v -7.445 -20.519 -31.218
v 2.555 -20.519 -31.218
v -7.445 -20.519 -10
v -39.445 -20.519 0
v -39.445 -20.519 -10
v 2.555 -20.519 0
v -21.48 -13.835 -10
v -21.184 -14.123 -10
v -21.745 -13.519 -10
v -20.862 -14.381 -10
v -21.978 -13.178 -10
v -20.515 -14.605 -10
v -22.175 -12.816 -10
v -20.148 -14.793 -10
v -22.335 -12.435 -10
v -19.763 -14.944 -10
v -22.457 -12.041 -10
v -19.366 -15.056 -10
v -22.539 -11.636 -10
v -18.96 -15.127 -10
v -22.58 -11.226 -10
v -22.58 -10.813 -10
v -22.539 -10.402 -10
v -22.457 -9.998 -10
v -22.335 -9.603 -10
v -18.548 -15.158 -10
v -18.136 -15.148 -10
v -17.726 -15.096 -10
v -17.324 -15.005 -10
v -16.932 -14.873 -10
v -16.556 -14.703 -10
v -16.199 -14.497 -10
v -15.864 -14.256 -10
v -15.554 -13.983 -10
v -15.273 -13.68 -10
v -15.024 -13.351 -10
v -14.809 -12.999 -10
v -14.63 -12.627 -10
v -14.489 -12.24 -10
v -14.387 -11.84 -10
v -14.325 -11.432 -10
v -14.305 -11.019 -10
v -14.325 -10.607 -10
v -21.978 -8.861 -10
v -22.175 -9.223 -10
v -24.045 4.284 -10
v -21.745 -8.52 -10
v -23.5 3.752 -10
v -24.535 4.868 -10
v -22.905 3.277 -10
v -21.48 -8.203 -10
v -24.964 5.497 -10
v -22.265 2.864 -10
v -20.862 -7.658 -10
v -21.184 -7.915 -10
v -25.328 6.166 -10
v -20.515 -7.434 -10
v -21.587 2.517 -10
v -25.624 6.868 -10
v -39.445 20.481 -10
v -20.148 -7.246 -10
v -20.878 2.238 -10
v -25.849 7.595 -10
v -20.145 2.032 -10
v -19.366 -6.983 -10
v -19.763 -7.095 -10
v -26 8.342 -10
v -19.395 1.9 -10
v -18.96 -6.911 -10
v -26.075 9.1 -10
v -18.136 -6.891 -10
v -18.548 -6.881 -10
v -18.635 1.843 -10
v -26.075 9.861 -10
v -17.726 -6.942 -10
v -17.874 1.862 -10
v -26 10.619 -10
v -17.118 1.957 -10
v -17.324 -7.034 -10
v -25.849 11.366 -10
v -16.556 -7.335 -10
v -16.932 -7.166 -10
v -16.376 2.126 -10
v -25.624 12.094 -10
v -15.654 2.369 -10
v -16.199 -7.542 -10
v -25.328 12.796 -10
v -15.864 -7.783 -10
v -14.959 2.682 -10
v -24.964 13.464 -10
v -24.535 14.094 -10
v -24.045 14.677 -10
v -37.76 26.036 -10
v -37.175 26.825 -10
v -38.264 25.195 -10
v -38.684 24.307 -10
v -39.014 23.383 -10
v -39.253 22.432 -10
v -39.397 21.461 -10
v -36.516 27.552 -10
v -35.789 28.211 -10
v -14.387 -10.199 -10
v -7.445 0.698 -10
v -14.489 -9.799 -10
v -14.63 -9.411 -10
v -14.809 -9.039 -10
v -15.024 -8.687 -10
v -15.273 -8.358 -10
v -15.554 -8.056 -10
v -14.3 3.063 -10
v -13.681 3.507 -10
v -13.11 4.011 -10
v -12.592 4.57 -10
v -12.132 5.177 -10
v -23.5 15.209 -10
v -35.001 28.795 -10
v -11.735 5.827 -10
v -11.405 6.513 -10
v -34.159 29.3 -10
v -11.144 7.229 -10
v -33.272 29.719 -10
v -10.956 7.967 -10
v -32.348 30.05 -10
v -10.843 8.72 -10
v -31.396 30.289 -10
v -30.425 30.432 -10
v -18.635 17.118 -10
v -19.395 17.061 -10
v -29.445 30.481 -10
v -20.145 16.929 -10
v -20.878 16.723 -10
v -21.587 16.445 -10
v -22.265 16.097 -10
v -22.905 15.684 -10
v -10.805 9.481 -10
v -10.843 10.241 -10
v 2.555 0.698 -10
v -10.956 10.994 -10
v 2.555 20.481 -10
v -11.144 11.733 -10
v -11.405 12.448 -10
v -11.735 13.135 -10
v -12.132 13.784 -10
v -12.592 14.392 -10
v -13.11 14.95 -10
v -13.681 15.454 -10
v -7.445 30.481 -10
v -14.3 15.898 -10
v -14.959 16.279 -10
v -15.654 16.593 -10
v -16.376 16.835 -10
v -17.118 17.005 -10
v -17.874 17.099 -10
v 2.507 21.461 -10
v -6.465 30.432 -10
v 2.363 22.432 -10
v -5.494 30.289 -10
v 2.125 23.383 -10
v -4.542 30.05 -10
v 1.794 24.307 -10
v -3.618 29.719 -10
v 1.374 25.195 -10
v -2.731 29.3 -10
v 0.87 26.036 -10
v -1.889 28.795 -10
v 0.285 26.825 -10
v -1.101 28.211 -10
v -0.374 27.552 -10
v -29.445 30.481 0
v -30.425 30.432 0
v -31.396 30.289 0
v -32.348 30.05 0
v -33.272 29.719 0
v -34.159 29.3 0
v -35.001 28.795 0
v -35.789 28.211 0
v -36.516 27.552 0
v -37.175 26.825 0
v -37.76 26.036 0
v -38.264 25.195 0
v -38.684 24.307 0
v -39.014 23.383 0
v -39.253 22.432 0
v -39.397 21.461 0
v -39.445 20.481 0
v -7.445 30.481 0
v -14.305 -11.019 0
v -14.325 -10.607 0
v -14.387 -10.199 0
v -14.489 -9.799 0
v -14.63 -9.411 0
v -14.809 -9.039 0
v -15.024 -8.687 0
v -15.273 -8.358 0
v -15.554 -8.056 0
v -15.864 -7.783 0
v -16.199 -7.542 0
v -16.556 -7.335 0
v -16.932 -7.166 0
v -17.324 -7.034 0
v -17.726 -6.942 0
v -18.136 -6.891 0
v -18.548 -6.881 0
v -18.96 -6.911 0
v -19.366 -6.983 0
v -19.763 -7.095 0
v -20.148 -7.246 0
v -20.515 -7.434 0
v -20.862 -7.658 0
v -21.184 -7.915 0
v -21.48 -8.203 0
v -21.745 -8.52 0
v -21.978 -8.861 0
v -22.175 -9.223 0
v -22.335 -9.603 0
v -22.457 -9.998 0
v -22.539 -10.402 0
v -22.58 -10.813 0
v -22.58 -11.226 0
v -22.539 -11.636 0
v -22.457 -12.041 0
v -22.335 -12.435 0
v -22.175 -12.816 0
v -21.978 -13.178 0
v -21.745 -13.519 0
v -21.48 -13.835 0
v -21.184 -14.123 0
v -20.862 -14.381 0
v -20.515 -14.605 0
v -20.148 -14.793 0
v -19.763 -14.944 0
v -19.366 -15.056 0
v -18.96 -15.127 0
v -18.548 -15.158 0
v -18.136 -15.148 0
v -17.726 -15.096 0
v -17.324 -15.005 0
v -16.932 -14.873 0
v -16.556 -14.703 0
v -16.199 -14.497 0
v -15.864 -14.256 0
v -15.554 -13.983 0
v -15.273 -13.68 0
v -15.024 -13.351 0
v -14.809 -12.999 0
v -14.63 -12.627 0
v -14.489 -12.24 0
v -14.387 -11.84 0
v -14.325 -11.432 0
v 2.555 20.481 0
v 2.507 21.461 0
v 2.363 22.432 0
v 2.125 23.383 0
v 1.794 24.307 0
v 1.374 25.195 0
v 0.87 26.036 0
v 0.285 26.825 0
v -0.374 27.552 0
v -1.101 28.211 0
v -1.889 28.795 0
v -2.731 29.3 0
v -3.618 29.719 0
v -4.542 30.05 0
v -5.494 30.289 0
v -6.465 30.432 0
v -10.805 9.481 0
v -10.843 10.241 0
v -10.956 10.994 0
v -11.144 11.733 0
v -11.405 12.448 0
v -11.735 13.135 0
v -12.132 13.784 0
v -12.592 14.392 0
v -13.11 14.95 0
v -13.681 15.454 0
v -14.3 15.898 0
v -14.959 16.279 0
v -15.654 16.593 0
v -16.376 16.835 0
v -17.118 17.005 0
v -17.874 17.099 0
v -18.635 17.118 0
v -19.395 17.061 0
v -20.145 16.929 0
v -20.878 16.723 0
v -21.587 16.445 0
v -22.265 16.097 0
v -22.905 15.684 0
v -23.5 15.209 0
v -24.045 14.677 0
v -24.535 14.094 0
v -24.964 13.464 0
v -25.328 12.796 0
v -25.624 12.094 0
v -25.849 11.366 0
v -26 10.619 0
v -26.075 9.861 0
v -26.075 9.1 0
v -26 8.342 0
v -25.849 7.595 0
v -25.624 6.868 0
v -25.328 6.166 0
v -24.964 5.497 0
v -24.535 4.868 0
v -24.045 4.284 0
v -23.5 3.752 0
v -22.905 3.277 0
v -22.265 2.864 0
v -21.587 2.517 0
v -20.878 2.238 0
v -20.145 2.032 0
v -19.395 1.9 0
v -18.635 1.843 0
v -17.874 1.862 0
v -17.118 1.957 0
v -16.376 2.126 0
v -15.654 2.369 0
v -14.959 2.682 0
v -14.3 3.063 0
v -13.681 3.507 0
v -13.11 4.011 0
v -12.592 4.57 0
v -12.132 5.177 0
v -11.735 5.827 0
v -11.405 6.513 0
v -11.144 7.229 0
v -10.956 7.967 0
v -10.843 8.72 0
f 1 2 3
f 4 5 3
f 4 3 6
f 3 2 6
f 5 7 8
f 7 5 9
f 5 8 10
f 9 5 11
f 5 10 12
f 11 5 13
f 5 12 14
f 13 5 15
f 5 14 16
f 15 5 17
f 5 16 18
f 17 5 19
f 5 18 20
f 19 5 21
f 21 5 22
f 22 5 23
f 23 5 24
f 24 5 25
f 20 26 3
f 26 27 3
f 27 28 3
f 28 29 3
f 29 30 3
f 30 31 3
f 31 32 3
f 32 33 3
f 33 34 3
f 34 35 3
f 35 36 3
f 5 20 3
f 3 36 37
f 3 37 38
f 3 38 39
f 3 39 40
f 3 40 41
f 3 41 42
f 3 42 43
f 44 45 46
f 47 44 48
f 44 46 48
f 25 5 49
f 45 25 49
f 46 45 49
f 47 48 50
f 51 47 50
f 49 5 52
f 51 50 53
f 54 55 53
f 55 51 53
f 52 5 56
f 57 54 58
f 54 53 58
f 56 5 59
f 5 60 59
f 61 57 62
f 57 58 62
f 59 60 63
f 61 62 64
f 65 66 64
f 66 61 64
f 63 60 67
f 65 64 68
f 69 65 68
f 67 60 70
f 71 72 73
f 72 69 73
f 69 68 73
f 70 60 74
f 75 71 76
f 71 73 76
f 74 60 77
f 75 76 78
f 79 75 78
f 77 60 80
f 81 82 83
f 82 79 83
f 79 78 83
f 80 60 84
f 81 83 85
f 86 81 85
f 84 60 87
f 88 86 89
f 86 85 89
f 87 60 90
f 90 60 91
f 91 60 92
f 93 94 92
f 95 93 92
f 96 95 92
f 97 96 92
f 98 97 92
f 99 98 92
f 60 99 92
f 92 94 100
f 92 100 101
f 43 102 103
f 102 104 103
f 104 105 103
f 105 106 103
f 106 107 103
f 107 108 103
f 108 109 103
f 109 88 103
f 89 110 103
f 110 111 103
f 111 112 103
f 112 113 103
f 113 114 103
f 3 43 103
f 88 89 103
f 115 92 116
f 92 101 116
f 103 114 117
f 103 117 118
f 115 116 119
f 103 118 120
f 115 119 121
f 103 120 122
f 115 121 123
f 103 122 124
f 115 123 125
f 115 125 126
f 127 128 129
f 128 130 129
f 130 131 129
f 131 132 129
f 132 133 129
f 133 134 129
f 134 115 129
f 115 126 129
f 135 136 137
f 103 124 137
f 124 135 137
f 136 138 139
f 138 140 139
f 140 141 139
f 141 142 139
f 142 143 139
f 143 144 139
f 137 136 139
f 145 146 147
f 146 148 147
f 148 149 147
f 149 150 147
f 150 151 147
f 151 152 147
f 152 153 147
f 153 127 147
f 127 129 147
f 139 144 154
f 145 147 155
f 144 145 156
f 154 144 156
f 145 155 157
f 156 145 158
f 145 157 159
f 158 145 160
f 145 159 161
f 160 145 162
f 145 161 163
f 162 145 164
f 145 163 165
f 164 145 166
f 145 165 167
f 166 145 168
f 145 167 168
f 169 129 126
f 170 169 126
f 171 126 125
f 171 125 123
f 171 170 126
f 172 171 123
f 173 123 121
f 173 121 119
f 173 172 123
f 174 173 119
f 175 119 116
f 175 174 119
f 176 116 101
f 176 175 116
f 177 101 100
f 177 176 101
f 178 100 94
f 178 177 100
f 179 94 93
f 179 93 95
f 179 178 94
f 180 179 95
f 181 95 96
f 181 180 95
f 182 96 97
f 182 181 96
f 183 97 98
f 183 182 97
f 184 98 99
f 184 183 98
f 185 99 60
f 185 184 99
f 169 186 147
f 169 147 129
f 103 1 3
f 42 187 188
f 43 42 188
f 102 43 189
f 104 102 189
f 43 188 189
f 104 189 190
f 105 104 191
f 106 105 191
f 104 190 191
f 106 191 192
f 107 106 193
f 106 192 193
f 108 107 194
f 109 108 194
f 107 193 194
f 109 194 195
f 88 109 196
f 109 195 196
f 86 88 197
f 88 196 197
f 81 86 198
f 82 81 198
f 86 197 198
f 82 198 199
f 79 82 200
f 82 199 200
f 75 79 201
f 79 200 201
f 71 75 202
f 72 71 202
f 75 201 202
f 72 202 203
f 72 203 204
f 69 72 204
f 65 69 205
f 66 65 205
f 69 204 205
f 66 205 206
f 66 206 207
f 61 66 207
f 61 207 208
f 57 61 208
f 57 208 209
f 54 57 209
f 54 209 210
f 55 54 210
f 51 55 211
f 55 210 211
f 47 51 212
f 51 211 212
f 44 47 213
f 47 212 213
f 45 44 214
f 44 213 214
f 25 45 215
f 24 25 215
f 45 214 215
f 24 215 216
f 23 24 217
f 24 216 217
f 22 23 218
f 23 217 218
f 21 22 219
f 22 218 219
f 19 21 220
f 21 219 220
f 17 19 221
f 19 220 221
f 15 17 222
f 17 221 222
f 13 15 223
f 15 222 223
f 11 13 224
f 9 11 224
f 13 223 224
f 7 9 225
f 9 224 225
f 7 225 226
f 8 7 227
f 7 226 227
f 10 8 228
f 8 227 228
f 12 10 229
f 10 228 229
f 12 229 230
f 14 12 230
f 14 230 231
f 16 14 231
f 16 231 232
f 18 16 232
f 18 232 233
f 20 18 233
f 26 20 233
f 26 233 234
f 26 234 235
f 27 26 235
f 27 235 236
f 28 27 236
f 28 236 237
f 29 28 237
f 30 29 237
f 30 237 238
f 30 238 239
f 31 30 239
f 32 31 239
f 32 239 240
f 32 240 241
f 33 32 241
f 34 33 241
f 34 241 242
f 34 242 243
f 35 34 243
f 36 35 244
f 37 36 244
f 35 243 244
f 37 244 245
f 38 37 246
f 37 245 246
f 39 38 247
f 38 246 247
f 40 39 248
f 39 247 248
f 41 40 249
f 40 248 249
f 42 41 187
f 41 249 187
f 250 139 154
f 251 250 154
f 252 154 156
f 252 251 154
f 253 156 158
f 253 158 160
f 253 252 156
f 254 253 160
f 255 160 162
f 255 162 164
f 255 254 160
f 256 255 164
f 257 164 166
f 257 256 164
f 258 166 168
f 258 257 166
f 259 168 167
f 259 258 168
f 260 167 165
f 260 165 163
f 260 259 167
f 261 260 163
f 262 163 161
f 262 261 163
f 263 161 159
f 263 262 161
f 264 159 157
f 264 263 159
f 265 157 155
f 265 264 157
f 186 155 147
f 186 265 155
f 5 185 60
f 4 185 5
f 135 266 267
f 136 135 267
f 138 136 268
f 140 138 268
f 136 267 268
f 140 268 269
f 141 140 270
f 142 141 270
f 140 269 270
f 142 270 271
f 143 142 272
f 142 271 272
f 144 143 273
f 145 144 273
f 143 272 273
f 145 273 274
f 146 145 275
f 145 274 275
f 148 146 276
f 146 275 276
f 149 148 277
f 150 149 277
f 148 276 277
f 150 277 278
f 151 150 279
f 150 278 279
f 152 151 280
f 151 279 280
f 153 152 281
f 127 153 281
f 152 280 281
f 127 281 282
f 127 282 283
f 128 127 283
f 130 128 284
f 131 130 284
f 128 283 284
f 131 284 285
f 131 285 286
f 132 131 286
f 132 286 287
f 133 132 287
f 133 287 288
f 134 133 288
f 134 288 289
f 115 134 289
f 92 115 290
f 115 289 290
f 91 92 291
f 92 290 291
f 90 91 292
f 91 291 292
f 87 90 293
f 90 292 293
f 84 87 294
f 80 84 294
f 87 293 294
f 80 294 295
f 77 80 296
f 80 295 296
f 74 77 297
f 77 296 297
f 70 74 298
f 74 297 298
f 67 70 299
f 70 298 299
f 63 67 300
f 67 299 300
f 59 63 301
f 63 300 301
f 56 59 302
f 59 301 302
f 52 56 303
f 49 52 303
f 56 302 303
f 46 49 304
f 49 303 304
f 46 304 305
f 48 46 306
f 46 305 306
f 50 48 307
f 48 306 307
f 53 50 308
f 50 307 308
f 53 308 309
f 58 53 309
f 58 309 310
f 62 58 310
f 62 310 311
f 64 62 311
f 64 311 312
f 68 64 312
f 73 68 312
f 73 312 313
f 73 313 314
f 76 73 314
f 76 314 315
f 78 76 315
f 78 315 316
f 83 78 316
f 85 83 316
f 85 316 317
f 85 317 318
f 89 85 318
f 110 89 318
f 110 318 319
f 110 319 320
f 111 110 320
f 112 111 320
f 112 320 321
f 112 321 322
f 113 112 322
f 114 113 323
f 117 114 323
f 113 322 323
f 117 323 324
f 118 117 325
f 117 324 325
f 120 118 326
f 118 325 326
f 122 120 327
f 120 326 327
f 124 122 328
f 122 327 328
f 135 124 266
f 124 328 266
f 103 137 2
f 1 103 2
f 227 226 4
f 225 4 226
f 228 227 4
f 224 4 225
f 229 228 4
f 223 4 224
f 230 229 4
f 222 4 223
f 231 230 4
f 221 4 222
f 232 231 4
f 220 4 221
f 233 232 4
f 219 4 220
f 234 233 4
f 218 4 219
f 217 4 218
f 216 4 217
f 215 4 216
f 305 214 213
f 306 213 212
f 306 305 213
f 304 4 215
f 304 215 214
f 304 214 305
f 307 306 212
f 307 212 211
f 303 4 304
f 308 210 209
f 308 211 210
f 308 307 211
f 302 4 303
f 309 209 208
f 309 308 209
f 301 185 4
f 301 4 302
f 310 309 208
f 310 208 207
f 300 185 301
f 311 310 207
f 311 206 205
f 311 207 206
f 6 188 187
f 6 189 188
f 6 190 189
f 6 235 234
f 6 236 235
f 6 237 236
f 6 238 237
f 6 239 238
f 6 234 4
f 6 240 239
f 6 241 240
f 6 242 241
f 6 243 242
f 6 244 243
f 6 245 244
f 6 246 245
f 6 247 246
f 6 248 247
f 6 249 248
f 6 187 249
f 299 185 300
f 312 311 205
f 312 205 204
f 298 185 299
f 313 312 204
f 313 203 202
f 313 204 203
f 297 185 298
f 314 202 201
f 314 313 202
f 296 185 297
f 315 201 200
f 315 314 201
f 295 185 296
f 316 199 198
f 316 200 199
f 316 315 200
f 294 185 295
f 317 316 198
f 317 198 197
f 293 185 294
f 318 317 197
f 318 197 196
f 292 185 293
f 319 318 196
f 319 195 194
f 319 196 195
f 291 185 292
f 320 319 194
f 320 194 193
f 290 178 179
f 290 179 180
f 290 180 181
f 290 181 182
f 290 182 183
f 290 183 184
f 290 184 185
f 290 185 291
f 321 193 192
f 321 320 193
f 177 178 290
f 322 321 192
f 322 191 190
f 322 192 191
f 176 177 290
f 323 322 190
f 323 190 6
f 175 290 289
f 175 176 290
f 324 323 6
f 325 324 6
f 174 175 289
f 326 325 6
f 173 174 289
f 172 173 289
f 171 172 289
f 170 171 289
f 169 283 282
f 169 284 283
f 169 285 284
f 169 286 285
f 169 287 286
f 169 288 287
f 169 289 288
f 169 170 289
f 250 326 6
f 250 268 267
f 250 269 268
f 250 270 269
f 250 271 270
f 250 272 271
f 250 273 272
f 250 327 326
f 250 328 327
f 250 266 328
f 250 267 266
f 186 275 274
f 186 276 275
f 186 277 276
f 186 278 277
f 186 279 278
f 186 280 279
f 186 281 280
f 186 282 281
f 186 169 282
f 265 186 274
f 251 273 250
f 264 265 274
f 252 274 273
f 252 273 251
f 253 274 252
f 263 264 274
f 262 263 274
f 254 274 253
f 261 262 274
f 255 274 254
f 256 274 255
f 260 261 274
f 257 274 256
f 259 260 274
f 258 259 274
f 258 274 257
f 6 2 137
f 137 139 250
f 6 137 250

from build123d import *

# Parameters (mm, degrees)
SKETCH1_R           = 7.64
SKETCH1_R_2         = 4.14
BOSS_EXTRUDE1_DEPTH = 10
BOSS_EXTRUDE2_DEPTH = 10


with BuildPart() as part:
    # Sketch1 → Boss-Extrude1 (new body)
    with BuildSketch(Plane.XY):
        with BuildLine():
            Line((-7.444896481, 30.480652594), (-29.444896481, 30.480652594))
            ThreePointArc((-29.444896481, 30.480652594), (-36.515964293, 27.551720406), (-39.444896481, 20.480652594))
            Line((-39.444896481, 20.480652594), (-39.444896481, -20.519347406))
            Line((-39.444896481, -20.519347406), (2.555103519, -20.519347406))
            Line((2.555103519, -20.519347406), (2.555103519, 20.480652594))
            ThreePointArc((2.555103519, 20.480652594), (-0.373828669, 27.551720406), (-7.444896481, 30.480652594))
        make_face()
        with Locations((-18.444896481, 9.480652594)):
            Circle(SKETCH1_R, mode=Mode.SUBTRACT)
        with Locations((-18.444896481, -11.019347406)):
            Circle(SKETCH1_R_2, mode=Mode.SUBTRACT)
    extrude(amount=-BOSS_EXTRUDE1_DEPTH)

    # Sketch2 → Boss-Extrude2 (add)
    with BuildSketch(Plane(origin=(2.555103519, 0, 0), x_dir=(0, 0, -1), z_dir=(1, 0, 0))):
        Polygon((10, 0.69821188), (31.217559285, -20.519347406), (10, -20.519347406), align=None)
    extrude(amount=-BOSS_EXTRUDE2_DEPTH)


solid = part.part
